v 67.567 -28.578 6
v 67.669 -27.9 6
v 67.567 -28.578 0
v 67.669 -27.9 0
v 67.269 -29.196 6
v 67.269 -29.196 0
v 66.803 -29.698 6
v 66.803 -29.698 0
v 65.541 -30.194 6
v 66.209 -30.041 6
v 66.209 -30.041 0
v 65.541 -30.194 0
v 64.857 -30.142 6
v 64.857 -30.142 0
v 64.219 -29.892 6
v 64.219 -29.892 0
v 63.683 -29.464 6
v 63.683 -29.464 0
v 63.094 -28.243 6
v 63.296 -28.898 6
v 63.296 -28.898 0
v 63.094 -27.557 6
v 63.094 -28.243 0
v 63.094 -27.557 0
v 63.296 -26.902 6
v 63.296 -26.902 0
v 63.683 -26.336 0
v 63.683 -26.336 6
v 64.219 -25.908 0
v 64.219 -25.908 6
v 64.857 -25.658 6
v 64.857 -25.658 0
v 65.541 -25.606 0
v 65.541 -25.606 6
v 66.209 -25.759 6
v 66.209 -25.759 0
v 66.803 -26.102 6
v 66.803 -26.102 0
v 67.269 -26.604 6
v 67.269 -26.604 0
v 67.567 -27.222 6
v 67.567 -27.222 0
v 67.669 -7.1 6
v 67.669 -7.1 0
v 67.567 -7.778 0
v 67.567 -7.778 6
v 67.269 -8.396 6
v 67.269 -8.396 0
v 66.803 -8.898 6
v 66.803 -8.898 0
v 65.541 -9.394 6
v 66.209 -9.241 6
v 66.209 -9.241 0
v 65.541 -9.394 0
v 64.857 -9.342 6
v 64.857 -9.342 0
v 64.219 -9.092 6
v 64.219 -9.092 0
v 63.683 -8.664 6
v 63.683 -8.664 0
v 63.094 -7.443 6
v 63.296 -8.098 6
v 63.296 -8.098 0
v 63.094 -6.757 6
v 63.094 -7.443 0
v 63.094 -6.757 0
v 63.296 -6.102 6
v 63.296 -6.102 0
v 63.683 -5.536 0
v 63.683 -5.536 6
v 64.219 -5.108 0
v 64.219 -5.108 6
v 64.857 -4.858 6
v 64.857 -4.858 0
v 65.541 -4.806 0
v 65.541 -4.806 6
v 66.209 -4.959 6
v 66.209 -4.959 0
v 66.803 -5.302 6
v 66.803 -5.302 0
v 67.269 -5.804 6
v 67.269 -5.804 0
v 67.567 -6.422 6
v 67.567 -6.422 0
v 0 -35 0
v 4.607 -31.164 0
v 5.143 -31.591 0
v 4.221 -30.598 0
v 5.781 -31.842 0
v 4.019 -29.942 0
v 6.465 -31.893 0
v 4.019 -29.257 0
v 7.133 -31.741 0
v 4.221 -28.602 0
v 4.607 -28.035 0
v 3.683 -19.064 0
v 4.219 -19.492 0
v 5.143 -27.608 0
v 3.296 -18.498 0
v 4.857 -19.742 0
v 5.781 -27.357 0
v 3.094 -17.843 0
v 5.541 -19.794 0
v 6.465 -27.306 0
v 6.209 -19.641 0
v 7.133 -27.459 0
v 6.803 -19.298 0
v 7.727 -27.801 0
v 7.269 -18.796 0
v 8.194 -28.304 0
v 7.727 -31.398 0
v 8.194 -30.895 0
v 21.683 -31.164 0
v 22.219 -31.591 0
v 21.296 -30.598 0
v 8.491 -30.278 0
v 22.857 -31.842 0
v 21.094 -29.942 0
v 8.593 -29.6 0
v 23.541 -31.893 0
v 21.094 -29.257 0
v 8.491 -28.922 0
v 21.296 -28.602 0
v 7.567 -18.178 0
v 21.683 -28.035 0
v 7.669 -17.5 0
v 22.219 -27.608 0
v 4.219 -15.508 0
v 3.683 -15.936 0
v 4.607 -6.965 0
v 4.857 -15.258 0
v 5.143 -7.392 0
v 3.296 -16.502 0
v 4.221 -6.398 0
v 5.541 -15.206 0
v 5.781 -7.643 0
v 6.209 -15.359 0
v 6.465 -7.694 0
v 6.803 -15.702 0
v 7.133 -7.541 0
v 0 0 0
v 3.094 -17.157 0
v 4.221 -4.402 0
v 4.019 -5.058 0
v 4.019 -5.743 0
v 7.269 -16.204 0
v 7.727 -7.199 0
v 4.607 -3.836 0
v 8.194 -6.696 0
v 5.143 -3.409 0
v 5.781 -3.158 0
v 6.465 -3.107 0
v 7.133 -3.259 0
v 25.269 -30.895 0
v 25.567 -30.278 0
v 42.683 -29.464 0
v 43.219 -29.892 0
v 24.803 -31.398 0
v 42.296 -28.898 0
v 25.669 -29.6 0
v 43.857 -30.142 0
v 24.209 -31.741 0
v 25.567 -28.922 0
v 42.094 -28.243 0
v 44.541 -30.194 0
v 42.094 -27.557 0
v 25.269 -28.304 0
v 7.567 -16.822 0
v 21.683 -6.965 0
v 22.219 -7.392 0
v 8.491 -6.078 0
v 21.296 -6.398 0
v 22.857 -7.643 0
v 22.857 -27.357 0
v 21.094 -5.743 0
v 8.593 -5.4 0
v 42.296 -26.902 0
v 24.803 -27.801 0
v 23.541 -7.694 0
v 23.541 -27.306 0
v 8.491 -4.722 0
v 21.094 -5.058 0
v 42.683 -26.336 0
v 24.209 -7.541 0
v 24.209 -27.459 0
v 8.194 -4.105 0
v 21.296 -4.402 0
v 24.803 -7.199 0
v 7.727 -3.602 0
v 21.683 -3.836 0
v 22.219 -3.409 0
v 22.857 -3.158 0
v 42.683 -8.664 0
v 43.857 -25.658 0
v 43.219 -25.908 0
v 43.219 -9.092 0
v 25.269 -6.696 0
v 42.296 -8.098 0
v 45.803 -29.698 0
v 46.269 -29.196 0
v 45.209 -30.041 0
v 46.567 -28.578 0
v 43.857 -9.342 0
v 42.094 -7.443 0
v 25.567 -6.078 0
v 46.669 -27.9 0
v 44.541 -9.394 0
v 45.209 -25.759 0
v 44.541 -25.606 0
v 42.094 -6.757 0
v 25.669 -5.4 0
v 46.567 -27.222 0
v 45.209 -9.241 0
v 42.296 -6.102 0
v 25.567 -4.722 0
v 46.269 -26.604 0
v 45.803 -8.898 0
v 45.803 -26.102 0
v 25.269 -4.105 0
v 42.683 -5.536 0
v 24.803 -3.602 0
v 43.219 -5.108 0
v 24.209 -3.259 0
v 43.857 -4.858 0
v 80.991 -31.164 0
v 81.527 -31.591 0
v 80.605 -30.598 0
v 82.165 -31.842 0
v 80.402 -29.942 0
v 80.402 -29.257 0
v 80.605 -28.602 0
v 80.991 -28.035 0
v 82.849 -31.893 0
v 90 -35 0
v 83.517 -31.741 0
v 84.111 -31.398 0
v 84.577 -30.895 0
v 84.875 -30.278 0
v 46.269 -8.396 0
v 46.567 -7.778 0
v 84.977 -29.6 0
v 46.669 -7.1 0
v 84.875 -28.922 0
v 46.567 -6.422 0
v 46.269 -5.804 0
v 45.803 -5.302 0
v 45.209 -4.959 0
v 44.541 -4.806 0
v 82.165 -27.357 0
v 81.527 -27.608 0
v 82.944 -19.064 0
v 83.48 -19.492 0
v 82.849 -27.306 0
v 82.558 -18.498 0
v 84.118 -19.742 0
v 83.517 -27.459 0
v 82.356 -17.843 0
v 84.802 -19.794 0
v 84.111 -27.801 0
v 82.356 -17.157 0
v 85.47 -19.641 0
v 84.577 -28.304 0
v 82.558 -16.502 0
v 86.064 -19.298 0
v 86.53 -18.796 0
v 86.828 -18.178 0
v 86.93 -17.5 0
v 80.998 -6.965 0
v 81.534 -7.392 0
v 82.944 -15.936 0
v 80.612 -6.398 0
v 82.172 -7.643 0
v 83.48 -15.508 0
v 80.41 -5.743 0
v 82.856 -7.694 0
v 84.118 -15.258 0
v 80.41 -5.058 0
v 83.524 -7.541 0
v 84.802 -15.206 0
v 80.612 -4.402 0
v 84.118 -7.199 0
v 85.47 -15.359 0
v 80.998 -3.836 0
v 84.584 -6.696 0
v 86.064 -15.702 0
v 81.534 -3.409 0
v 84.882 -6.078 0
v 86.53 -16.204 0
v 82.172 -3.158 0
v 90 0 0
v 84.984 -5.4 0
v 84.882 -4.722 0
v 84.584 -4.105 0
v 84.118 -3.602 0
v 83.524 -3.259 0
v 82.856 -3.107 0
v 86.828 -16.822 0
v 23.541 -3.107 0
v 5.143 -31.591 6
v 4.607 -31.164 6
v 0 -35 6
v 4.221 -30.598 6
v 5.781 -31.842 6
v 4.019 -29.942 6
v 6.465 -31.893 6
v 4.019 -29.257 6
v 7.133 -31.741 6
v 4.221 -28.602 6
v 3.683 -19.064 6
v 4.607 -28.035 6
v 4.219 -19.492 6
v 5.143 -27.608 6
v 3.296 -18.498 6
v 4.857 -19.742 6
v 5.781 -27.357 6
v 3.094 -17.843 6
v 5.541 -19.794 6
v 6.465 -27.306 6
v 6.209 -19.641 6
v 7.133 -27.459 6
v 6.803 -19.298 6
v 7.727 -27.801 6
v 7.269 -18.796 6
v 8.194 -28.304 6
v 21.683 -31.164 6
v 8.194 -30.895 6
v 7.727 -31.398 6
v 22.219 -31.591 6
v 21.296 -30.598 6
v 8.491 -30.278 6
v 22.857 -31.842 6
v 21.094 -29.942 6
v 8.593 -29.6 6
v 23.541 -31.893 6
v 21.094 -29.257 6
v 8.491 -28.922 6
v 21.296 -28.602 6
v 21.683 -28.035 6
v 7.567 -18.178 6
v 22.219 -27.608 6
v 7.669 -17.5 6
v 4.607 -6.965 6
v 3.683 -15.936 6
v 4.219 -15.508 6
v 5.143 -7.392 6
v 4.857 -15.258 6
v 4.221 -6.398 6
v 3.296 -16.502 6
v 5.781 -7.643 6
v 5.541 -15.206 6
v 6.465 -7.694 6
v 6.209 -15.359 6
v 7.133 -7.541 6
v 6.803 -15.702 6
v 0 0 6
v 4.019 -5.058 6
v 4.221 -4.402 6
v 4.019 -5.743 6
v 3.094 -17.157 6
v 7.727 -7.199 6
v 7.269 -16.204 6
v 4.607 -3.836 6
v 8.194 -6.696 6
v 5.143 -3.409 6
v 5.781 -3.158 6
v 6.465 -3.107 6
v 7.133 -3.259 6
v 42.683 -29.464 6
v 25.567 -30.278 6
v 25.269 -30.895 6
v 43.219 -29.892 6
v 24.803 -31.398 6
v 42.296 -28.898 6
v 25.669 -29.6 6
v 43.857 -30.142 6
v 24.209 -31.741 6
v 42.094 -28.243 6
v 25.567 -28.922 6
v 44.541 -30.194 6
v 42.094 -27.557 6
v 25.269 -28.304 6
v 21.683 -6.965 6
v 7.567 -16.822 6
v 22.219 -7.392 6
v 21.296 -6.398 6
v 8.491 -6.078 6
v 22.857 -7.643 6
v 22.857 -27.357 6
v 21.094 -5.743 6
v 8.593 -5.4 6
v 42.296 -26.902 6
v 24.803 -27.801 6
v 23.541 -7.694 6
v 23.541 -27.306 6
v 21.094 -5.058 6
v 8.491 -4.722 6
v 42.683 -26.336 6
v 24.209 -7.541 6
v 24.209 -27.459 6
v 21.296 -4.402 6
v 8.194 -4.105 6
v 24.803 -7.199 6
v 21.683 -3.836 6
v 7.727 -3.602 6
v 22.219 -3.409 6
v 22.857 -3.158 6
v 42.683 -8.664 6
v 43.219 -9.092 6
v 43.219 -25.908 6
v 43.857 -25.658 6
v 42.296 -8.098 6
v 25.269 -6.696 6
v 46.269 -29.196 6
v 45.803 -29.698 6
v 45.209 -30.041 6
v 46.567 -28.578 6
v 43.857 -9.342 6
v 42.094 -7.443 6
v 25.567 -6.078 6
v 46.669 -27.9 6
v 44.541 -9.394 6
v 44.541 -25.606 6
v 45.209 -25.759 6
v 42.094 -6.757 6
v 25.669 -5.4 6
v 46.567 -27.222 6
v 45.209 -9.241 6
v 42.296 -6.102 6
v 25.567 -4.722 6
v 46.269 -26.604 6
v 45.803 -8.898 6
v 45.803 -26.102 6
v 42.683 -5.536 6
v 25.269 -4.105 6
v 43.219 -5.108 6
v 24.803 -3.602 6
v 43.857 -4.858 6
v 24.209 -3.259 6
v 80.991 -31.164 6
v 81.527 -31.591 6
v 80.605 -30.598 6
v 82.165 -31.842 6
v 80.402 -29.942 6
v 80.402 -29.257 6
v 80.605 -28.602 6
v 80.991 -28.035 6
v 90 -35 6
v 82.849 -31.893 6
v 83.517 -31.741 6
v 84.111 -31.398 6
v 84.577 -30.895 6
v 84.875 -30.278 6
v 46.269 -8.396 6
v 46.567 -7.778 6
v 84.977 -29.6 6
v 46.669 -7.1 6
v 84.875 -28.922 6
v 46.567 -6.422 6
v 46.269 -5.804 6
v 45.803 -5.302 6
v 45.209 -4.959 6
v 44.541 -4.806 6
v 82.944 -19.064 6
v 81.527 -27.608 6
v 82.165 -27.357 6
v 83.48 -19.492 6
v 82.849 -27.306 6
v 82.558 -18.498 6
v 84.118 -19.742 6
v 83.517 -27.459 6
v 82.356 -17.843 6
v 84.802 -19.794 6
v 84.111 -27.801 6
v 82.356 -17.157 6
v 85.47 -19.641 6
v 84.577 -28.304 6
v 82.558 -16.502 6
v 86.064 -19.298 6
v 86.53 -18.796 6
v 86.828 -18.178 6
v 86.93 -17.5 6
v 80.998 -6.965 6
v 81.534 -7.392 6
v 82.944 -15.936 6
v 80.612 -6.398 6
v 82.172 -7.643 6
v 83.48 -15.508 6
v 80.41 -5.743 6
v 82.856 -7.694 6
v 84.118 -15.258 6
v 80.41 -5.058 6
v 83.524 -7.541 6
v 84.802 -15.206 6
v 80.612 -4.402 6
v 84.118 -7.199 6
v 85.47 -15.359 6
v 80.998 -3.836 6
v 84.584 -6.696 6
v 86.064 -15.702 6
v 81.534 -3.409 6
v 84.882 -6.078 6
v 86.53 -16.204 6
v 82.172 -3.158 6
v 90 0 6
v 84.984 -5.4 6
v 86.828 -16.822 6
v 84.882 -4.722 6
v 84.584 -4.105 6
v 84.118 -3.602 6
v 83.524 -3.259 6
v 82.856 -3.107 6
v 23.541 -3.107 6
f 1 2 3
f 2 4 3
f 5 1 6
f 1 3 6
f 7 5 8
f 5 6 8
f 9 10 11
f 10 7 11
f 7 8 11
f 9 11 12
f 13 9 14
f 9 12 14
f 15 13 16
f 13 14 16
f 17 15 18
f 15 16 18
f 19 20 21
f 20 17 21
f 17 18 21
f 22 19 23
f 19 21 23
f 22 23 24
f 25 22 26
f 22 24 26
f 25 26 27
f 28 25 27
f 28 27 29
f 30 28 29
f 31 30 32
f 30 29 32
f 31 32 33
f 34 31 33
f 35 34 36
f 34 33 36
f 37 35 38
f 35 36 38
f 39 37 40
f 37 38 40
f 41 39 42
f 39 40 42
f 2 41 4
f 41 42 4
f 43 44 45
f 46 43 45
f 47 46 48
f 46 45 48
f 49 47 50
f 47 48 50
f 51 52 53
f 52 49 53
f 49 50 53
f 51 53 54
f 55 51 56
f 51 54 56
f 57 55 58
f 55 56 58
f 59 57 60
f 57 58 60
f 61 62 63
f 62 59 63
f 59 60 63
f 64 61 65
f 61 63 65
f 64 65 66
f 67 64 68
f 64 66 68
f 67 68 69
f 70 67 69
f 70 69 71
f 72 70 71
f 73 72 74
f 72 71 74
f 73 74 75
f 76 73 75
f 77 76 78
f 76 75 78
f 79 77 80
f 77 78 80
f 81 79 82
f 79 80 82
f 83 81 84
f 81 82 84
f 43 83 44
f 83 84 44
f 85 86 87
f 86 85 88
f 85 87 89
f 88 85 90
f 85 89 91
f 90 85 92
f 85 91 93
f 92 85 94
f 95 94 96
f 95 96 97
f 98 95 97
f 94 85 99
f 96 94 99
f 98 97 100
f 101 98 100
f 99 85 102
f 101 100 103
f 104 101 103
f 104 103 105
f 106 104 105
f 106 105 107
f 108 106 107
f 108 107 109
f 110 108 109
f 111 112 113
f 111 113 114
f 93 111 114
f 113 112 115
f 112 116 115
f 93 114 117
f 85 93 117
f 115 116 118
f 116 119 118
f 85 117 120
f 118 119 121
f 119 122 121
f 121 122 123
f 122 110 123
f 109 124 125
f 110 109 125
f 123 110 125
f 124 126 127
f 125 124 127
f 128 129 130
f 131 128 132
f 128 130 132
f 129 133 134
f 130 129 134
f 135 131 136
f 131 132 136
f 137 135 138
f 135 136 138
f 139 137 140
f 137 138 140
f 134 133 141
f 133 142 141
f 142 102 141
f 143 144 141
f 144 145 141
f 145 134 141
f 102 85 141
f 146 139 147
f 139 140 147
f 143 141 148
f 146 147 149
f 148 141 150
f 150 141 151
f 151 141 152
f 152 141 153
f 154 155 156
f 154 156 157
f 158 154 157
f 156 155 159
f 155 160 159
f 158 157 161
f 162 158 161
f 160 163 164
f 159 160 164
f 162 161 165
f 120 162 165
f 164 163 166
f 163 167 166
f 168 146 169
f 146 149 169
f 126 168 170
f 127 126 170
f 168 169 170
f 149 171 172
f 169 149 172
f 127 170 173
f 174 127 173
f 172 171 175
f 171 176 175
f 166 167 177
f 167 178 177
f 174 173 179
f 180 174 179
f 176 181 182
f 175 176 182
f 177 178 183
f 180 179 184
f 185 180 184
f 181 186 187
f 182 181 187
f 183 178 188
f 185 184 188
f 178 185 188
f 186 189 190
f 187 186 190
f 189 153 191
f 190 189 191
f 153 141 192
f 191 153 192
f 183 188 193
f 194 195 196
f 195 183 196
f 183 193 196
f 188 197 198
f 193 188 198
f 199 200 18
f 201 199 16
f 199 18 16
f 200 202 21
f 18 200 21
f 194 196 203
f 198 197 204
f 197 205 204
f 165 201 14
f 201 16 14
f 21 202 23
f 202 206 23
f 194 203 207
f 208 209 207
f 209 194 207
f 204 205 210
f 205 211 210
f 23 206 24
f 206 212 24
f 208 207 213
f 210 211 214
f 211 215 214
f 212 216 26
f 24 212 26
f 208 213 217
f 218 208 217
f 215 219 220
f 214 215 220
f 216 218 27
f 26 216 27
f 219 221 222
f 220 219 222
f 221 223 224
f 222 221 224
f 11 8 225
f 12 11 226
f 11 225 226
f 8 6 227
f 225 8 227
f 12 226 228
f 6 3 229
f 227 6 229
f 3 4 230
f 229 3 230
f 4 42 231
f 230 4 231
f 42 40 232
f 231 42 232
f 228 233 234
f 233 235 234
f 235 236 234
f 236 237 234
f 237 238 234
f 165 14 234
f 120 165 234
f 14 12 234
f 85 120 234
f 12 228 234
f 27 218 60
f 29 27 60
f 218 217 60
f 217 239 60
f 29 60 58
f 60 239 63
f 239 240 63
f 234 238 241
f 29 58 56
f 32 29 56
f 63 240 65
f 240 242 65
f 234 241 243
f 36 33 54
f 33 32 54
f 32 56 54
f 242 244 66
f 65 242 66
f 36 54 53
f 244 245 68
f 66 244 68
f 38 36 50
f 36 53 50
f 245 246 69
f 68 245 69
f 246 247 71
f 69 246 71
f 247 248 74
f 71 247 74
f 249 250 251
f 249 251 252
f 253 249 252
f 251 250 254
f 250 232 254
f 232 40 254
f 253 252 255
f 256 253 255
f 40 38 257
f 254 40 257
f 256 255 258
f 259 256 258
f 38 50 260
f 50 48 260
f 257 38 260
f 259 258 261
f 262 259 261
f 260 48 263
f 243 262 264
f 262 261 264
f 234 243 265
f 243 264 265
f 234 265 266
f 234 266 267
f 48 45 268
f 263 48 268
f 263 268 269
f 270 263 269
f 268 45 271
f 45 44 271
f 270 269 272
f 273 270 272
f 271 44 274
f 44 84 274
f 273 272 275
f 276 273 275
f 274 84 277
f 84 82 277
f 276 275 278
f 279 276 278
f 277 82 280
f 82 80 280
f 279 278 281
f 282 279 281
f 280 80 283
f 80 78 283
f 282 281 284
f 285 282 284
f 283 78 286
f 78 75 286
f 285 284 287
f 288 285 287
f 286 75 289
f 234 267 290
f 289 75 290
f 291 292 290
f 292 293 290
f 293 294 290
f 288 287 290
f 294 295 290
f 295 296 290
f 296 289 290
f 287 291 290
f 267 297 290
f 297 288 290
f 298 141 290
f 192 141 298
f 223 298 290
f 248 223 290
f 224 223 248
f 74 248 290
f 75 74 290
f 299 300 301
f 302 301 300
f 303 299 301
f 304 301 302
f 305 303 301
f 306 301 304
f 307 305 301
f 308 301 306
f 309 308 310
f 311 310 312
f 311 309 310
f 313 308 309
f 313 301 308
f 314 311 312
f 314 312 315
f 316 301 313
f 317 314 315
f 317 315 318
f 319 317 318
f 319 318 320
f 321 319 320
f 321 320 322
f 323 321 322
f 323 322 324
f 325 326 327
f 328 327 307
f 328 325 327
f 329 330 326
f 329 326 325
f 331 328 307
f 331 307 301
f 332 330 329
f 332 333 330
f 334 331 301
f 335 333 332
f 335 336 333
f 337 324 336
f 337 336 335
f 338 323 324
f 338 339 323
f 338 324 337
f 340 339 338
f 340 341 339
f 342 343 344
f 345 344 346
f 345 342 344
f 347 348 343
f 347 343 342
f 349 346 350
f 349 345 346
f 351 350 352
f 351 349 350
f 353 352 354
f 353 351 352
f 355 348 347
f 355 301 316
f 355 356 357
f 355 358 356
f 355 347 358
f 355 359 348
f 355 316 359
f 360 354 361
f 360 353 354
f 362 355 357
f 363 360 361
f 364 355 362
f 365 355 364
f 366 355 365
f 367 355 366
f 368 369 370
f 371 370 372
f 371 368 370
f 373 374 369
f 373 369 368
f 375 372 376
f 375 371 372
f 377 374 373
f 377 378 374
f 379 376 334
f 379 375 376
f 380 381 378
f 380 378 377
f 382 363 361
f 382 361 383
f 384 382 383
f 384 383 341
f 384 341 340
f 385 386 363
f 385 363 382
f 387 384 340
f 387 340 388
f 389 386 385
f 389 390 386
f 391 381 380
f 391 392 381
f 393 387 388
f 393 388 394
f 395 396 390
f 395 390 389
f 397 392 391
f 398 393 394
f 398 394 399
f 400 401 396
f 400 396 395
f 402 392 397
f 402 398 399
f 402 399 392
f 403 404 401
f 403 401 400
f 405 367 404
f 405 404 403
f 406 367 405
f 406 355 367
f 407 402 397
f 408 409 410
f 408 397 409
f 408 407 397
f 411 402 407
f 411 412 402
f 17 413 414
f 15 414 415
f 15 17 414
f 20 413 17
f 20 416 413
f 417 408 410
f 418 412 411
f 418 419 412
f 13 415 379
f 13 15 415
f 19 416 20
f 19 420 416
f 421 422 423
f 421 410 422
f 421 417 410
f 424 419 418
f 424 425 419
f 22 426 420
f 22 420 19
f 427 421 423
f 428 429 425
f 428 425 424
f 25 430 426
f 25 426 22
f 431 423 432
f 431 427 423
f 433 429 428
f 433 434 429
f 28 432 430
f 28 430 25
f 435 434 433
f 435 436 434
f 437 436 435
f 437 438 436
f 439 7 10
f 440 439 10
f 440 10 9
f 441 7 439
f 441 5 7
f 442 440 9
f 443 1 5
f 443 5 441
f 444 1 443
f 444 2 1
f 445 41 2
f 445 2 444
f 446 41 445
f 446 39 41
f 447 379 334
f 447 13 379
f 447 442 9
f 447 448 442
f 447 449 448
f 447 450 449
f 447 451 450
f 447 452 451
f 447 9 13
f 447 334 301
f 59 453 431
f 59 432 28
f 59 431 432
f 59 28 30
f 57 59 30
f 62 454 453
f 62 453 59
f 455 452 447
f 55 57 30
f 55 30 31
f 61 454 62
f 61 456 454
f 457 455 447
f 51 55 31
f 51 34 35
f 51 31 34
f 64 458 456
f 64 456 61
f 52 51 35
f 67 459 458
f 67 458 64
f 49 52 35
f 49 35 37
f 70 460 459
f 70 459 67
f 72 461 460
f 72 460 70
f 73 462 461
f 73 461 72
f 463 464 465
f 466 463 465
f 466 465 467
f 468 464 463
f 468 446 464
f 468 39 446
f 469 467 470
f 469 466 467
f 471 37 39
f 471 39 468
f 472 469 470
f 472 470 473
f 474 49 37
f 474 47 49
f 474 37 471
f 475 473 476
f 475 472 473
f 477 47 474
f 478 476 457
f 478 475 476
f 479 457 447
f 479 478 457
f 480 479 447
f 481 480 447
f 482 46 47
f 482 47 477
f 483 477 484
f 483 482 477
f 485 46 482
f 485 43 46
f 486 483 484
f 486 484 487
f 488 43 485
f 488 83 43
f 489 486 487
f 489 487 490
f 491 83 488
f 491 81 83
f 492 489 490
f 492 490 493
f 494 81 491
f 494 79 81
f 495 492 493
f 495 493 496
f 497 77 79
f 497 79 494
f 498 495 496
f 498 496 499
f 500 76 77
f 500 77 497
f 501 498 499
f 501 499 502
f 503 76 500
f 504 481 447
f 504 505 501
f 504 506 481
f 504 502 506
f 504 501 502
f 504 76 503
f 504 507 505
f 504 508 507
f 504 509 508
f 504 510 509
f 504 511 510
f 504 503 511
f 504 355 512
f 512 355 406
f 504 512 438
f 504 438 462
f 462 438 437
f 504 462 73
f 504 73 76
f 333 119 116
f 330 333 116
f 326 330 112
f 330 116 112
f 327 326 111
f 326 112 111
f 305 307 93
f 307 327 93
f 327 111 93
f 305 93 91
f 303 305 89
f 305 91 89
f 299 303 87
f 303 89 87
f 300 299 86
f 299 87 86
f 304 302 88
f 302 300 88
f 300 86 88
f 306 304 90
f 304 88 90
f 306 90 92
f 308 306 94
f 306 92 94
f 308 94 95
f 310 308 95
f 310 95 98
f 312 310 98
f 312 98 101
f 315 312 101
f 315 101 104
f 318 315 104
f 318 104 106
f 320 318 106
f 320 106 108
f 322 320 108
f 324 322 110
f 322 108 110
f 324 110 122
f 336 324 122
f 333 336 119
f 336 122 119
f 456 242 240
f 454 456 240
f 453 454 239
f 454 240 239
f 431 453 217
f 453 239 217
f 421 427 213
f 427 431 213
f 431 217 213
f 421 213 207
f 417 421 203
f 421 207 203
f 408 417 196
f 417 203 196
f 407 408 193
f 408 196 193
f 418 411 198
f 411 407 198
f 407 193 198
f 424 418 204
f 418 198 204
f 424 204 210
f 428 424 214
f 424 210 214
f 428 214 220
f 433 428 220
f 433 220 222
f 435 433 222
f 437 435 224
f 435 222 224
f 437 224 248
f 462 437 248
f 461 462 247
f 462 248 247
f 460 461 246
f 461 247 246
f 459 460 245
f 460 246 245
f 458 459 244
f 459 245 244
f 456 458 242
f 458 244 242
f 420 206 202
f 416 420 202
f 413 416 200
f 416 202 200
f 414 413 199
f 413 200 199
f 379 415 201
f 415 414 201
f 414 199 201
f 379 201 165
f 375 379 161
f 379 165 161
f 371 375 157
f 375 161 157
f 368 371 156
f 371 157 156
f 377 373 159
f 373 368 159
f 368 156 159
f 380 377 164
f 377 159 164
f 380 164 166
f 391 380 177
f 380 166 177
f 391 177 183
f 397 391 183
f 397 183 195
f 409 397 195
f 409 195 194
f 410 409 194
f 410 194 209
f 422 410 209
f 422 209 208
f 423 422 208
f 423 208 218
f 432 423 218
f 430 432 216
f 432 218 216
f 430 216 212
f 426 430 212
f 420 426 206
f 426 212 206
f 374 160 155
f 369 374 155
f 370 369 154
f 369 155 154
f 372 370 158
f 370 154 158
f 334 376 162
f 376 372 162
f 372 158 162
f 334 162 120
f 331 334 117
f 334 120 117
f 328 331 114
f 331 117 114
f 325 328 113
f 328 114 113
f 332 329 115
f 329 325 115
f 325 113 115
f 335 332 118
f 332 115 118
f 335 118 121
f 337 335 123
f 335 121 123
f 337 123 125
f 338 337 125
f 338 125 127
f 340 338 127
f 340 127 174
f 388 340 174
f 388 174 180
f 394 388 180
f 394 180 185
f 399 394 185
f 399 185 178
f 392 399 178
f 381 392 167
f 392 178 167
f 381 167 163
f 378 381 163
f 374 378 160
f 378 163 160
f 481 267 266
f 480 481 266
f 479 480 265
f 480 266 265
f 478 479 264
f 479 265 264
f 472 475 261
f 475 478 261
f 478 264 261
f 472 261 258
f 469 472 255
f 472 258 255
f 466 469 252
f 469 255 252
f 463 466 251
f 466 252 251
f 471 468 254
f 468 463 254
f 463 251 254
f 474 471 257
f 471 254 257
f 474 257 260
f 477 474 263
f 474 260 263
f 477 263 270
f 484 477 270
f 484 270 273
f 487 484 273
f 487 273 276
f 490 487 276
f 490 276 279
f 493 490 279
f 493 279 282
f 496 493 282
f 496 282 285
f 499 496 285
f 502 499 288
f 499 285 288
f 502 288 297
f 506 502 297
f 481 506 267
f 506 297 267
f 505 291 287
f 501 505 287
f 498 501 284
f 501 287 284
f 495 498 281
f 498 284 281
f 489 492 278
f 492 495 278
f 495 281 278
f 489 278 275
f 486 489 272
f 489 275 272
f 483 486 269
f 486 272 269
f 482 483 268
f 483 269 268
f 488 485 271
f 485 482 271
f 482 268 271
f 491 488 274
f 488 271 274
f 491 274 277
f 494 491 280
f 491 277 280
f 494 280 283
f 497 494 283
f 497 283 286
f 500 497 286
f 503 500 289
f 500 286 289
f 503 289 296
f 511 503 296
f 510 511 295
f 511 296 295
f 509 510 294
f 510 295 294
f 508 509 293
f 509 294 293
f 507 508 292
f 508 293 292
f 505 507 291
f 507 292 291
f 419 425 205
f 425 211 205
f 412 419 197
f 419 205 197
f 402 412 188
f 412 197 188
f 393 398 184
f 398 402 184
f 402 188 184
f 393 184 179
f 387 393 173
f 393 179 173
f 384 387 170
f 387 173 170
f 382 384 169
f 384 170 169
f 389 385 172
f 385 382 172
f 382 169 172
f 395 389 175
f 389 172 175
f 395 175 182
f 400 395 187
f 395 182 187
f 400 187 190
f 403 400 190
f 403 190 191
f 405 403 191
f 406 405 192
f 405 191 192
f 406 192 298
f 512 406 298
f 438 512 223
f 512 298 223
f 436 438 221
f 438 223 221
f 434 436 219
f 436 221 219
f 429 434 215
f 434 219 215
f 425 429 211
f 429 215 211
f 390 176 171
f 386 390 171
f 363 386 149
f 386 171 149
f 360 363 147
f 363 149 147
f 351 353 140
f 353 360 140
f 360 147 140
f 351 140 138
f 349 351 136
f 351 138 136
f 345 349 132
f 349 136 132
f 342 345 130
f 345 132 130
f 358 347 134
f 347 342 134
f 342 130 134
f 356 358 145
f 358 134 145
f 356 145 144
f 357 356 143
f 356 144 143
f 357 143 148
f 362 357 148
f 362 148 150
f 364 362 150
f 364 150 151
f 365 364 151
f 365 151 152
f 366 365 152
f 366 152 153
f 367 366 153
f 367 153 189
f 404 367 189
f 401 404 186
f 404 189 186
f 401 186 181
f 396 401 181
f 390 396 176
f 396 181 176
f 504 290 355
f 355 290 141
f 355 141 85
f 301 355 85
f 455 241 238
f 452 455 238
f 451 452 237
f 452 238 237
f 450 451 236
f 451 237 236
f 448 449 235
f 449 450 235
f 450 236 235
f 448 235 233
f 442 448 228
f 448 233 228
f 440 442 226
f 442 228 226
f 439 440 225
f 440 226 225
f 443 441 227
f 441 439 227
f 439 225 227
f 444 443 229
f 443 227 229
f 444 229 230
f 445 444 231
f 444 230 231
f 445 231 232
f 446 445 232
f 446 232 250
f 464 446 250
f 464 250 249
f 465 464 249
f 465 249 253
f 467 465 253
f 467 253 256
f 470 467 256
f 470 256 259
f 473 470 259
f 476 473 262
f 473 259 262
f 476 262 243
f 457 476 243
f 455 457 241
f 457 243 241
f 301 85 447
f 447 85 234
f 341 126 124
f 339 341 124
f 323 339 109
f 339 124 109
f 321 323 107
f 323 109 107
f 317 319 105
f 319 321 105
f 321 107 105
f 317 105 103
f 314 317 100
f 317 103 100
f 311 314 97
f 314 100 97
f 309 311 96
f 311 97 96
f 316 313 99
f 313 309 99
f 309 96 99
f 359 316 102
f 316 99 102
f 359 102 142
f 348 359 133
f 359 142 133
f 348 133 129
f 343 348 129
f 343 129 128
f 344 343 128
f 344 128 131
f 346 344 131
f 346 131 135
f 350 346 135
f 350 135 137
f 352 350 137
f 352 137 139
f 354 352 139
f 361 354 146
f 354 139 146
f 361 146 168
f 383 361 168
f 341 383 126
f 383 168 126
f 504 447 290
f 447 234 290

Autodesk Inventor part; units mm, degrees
ref_plane "YZ Plane" through (0, 0, 0) normal (1, 0, 0) x (0, 1, 0)
ref_plane "XZ Plane" through (0, 0, 0) normal (0, 1, 0) x (-1, 0, 0)
ref_plane "XY Plane" through (0, 0, 0) normal (0, 0, 1) x (1, 0, 0)
sketch "Esboço1" plane through (0, 0, 0) normal (0, 0, 1) x (1, 0, 0)
  line L0 (90, 0) -> (0, 0)
  line L1 (0, 0) -> (0, -35)
  line L2 (0, -35) -> (90, -35)
  line L3 (90, -35) -> (90, 0)
  circle A0 centre (65.3687, -7.1) radius 2.3
  circle A1 centre (23.3687, -29.5996) radius 2.3
  circle A2 centre (44.3687, -27.9) radius 2.3
  circle A3 centre (44.3687, -7.1) radius 2.3
  circle A4 centre (84.63, -17.5) radius 2.3
  circle A5 centre (5.3687, -17.5) radius 2.3
  circle A6 centre (65.3687, -27.9) radius 2.3
  circle A7 centre (23.3687, -5.4004) radius 2.3
  circle A8 centre (6.2932, -5.4004) radius 2.3
  circle A9 centre (6.2932, -29.5996) radius 2.3
  circle A10 centre (82.6841, -5.4004) radius 2.3
  circle A11 centre (82.6768, -29.5996) radius 2.3
extrude "Extrusão1" add sketch "Esboço1" along normal blind 6
properties part number "acrilico base" material "Acrílico"
